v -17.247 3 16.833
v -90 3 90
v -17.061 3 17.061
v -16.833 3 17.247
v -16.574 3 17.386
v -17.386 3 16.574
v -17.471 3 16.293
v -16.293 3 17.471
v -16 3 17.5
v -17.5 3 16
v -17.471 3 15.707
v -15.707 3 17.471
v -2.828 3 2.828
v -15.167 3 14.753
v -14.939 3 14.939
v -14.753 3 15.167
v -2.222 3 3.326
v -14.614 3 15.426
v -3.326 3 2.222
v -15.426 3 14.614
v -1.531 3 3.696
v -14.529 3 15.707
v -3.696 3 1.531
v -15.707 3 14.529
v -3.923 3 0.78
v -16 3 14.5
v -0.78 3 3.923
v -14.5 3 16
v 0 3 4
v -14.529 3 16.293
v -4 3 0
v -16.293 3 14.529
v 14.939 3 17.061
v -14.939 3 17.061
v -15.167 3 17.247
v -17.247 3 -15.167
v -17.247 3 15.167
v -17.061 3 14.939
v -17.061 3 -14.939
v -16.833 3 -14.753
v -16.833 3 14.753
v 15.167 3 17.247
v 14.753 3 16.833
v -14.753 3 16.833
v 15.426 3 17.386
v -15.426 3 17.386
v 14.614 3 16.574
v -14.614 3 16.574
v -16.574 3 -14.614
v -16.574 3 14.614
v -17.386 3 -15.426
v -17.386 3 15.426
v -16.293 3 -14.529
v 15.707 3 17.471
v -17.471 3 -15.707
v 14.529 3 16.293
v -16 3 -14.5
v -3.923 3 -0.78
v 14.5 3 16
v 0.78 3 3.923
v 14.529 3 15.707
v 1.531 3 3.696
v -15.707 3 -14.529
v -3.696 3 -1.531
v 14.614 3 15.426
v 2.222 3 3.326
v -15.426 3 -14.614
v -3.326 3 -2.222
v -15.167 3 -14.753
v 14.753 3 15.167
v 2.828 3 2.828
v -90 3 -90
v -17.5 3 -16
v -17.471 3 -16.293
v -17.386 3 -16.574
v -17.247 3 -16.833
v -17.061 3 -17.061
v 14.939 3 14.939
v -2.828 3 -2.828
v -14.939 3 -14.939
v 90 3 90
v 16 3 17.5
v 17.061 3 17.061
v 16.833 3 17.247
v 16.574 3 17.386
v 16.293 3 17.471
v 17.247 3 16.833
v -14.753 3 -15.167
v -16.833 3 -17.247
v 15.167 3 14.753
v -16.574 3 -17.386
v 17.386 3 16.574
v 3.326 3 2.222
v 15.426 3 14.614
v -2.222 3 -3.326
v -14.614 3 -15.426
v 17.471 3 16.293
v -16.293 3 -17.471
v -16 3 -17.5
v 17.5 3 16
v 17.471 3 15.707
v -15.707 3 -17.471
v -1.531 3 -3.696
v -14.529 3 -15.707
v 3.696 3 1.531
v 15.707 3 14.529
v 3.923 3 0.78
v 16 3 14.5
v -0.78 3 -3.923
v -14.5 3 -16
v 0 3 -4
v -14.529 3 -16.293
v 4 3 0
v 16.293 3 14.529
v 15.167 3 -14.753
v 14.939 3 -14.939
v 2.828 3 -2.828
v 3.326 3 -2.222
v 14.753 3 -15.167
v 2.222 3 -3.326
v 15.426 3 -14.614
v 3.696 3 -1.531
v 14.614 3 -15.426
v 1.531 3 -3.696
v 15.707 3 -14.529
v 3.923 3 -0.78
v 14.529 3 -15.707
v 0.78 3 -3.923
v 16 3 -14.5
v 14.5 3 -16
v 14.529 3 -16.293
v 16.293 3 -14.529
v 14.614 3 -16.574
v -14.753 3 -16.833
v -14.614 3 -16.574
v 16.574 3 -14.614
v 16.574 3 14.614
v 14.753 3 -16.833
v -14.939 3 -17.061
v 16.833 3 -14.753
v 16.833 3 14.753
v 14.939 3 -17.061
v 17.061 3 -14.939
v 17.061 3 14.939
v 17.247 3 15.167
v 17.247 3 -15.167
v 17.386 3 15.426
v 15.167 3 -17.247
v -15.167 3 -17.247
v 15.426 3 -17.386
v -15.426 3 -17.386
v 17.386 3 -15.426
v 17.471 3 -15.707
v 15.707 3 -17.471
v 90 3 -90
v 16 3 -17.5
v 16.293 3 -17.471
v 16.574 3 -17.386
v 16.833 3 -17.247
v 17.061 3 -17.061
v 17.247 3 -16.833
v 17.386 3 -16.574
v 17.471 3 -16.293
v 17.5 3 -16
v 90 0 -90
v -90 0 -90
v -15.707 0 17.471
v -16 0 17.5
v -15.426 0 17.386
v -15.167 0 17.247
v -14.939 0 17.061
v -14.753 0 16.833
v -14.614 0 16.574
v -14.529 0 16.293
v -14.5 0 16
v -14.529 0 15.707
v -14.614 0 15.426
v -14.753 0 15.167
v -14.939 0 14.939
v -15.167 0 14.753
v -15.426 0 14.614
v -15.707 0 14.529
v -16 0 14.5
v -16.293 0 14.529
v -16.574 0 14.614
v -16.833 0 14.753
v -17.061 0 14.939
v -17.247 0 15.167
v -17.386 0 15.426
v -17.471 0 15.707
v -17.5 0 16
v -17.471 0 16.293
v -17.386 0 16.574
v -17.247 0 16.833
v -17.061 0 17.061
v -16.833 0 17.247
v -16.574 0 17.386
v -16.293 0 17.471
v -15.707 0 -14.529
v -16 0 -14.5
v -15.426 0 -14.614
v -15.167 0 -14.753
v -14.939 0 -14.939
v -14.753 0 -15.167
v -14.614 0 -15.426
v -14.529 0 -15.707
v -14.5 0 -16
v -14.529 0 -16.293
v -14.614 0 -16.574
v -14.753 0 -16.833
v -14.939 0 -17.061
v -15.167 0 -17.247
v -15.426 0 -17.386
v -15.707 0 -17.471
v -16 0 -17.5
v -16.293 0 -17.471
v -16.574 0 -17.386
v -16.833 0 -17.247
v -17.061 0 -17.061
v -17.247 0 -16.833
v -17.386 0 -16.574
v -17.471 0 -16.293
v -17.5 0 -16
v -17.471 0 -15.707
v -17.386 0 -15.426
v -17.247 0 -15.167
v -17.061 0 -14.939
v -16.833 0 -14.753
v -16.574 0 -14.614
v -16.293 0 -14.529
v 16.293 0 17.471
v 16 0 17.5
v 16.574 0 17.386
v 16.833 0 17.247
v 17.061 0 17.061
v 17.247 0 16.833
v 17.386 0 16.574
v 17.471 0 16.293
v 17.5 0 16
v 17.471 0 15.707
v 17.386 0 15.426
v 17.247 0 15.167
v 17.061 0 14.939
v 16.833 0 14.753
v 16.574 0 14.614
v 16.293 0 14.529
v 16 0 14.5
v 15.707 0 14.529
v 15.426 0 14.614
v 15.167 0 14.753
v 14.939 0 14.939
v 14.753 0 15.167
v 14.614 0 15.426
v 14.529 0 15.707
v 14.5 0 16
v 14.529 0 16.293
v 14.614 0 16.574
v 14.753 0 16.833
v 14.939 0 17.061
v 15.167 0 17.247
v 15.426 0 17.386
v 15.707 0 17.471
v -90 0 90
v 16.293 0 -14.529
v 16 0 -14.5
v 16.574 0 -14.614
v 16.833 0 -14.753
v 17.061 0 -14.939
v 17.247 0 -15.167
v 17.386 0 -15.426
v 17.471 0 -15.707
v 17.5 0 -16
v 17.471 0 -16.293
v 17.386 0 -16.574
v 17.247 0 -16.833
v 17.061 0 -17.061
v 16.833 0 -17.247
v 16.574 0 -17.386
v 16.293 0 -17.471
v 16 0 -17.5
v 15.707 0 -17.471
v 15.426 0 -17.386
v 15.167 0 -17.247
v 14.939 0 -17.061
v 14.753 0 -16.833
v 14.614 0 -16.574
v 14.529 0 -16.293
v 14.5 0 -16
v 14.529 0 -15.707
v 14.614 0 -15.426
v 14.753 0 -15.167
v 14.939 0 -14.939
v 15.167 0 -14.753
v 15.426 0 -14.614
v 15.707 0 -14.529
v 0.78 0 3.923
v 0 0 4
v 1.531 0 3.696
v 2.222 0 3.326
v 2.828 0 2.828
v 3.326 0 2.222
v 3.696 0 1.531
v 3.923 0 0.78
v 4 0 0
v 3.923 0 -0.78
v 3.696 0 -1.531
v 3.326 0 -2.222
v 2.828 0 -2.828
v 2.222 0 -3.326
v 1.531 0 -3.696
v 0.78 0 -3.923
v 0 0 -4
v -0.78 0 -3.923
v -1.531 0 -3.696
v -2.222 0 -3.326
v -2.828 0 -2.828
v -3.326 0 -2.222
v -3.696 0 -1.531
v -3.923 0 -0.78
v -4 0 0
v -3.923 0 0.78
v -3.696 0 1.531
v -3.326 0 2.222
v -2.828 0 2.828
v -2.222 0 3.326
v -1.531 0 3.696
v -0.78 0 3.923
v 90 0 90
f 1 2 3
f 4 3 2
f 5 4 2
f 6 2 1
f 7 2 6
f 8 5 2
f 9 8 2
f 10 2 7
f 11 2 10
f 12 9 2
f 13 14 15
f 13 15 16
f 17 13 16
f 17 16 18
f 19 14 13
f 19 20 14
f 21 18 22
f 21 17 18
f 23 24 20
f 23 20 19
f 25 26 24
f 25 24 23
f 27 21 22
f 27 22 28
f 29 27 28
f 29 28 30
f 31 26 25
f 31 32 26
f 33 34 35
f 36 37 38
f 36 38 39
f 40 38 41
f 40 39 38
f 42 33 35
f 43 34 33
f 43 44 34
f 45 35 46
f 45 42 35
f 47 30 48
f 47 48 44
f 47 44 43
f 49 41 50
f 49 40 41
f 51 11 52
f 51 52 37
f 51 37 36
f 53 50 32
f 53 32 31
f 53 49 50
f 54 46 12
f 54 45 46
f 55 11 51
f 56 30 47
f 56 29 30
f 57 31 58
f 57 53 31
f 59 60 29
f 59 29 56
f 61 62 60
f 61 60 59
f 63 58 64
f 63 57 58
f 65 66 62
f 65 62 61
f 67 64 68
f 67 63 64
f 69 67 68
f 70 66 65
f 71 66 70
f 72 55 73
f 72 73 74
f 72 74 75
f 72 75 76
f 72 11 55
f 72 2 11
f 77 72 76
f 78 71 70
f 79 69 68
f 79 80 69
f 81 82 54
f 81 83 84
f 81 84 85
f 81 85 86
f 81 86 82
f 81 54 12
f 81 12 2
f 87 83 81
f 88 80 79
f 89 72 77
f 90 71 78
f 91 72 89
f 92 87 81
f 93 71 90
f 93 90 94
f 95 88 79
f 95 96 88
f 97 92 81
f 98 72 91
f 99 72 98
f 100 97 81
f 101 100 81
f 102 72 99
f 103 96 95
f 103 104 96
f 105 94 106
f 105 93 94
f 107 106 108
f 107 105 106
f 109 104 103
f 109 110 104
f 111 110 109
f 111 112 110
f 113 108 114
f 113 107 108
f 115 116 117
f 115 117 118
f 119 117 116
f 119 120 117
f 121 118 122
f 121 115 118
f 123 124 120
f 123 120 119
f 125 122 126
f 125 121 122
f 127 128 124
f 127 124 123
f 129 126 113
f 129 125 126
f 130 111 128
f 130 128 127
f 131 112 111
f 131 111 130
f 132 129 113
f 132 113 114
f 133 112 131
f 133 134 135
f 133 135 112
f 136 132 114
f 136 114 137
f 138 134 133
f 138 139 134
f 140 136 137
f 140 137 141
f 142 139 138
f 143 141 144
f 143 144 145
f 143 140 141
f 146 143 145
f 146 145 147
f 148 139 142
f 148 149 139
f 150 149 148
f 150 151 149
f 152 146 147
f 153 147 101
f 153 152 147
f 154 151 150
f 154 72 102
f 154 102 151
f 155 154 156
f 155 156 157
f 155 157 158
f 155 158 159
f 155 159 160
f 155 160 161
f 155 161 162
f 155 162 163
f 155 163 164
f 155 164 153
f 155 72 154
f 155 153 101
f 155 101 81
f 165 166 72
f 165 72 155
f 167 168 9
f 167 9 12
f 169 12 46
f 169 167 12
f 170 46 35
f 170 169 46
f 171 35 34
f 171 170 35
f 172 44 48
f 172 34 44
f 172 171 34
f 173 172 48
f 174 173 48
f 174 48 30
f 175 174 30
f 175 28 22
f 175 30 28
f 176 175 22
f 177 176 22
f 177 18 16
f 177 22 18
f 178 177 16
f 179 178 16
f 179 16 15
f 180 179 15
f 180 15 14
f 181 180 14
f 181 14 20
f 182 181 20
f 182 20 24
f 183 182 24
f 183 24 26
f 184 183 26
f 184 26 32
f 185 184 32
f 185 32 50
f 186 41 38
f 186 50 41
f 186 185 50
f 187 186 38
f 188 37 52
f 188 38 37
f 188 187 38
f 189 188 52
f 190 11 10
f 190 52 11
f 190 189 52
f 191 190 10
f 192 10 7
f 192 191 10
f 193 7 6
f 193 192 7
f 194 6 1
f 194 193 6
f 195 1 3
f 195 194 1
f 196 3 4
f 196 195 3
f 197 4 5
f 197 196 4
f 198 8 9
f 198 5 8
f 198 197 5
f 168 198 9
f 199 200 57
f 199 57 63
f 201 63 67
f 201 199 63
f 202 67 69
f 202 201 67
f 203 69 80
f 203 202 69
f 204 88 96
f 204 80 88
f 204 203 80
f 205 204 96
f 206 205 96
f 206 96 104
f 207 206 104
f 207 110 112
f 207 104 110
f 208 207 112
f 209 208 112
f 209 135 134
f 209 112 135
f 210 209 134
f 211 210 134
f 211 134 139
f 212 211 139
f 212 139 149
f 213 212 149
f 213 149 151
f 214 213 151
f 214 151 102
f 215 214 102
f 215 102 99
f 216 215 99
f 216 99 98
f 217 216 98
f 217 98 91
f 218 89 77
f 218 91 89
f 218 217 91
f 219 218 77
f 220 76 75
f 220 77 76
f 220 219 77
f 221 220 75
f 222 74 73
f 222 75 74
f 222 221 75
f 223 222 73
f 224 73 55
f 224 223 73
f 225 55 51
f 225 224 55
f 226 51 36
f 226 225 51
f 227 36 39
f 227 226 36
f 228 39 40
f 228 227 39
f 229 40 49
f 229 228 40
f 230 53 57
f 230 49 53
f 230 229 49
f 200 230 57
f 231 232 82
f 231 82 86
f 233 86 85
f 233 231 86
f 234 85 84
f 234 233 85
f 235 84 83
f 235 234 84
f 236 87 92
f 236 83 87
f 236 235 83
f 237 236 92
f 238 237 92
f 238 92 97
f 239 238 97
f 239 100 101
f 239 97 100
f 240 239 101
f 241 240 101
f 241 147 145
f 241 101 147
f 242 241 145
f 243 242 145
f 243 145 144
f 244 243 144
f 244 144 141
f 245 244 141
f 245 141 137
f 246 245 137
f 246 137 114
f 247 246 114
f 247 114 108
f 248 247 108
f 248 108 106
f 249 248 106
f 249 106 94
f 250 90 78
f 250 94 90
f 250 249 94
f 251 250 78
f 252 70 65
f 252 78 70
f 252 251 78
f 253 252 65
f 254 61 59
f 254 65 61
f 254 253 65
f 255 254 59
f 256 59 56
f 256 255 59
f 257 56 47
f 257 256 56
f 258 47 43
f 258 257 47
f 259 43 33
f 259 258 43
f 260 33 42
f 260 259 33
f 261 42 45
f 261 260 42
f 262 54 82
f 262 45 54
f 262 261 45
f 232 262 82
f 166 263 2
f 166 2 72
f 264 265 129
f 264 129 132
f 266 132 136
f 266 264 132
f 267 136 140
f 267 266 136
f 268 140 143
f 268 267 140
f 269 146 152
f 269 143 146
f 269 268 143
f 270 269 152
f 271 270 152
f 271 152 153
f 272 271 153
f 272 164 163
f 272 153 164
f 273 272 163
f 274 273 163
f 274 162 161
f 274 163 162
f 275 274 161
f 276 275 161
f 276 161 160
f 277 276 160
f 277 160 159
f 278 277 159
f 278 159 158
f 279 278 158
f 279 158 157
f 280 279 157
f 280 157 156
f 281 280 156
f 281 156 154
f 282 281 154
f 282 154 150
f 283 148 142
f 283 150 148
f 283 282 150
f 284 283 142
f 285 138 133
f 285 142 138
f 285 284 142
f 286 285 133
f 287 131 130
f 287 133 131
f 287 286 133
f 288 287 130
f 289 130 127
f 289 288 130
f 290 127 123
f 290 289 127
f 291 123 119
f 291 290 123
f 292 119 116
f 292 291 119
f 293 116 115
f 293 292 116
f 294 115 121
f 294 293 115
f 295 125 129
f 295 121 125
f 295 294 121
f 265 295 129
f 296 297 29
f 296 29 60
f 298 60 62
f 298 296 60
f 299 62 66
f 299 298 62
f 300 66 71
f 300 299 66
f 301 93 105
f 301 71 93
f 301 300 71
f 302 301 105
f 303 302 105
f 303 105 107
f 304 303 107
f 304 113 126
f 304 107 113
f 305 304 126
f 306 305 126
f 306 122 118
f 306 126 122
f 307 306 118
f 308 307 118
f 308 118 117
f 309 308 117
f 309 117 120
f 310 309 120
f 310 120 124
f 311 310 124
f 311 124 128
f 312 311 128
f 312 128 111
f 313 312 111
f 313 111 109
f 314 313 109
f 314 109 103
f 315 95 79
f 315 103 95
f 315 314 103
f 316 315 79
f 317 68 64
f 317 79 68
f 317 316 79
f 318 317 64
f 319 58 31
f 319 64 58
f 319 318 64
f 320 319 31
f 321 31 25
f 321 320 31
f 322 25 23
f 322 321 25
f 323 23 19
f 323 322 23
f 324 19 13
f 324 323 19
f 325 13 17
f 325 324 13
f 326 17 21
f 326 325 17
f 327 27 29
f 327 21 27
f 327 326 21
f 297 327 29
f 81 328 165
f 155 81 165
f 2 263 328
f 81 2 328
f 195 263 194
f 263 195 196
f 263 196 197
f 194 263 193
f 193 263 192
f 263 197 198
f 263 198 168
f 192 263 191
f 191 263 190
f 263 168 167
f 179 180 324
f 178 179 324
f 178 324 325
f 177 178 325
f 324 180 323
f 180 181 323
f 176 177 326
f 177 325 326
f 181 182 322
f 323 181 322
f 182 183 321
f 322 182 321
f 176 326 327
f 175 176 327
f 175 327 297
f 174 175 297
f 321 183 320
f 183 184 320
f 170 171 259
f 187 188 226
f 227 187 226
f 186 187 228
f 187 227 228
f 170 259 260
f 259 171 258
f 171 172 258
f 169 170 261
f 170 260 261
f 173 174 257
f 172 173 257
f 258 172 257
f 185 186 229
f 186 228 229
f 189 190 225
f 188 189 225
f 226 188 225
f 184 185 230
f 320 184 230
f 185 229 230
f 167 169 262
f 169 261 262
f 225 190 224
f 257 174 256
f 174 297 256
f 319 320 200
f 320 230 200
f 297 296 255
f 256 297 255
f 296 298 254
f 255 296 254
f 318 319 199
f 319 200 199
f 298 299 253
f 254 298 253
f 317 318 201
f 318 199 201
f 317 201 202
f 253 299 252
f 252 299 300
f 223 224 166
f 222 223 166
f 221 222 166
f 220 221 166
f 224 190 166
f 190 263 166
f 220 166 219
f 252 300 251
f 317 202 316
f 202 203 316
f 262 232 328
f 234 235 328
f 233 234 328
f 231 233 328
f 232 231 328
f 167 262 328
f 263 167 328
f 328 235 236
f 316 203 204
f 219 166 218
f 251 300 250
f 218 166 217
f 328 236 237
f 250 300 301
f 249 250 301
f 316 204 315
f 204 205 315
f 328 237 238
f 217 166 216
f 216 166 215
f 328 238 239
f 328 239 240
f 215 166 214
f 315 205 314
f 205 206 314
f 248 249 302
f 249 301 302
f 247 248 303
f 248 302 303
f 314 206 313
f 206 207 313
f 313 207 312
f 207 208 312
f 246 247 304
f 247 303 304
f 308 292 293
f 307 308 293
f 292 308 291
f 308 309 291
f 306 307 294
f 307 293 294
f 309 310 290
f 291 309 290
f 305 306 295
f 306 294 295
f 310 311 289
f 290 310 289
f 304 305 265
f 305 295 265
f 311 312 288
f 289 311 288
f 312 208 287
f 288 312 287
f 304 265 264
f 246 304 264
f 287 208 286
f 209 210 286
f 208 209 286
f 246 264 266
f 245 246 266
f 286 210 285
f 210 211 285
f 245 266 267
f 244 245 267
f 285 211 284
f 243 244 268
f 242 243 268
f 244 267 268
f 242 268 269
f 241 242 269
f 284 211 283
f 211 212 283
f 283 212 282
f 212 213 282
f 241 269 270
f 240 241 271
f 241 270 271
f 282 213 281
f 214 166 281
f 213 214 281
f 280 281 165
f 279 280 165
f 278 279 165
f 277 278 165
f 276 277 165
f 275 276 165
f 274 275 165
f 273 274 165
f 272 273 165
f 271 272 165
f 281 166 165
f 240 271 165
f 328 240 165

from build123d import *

# Parameters (mm, degrees)
SKETCH1_W               = 180
SKETCH1_H               = 180
BOSS_EXTRUDE1_DEPTH     = 3
CUT_EXTRUDE1_DEPTH      = 128.314571044
CUT_EXTRUDE1_DEPTH_BACK = 128.314571044
SKETCH2_R               = 4
SKETCH2_R_2             = 1.5


with BuildPart() as part:
    # Sketch1 → Boss-Extrude1 (new body)
    with BuildSketch(Plane(origin=(0, 0, 0), x_dir=(1, 0, 0), z_dir=(0, 1, 0))):
        Rectangle(SKETCH1_W, SKETCH1_H)
    extrude(amount=BOSS_EXTRUDE1_DEPTH)

    # Sketch2 → Cut-Extrude1 (cut, two sides: drawn at the far end of the back side and taken through both)
    with BuildSketch(Plane(origin=(0, 3, 0), x_dir=(1, 0, 0), z_dir=(0, 1, 0)).offset(-CUT_EXTRUDE1_DEPTH_BACK)):
        with Locations(Location((0, 0, 0), (0, 0, 270))):
            Circle(SKETCH2_R)
        with Locations(Location((-16, 16, 0), (0, 0, 270))):
            Circle(SKETCH2_R_2)
        with Locations(Location((16, 16, 0), (0, 0, 270))):
            Circle(SKETCH2_R_2)
        with Locations(Location((16, -16, 0), (0, 0, 270))):
            Circle(SKETCH2_R_2)
        with Locations(Location((-16, -16, 0), (0, 0, 270))):
            Circle(SKETCH2_R_2)
    extrude(amount=CUT_EXTRUDE1_DEPTH + CUT_EXTRUDE1_DEPTH_BACK, mode=Mode.SUBTRACT)


solid = part.part
